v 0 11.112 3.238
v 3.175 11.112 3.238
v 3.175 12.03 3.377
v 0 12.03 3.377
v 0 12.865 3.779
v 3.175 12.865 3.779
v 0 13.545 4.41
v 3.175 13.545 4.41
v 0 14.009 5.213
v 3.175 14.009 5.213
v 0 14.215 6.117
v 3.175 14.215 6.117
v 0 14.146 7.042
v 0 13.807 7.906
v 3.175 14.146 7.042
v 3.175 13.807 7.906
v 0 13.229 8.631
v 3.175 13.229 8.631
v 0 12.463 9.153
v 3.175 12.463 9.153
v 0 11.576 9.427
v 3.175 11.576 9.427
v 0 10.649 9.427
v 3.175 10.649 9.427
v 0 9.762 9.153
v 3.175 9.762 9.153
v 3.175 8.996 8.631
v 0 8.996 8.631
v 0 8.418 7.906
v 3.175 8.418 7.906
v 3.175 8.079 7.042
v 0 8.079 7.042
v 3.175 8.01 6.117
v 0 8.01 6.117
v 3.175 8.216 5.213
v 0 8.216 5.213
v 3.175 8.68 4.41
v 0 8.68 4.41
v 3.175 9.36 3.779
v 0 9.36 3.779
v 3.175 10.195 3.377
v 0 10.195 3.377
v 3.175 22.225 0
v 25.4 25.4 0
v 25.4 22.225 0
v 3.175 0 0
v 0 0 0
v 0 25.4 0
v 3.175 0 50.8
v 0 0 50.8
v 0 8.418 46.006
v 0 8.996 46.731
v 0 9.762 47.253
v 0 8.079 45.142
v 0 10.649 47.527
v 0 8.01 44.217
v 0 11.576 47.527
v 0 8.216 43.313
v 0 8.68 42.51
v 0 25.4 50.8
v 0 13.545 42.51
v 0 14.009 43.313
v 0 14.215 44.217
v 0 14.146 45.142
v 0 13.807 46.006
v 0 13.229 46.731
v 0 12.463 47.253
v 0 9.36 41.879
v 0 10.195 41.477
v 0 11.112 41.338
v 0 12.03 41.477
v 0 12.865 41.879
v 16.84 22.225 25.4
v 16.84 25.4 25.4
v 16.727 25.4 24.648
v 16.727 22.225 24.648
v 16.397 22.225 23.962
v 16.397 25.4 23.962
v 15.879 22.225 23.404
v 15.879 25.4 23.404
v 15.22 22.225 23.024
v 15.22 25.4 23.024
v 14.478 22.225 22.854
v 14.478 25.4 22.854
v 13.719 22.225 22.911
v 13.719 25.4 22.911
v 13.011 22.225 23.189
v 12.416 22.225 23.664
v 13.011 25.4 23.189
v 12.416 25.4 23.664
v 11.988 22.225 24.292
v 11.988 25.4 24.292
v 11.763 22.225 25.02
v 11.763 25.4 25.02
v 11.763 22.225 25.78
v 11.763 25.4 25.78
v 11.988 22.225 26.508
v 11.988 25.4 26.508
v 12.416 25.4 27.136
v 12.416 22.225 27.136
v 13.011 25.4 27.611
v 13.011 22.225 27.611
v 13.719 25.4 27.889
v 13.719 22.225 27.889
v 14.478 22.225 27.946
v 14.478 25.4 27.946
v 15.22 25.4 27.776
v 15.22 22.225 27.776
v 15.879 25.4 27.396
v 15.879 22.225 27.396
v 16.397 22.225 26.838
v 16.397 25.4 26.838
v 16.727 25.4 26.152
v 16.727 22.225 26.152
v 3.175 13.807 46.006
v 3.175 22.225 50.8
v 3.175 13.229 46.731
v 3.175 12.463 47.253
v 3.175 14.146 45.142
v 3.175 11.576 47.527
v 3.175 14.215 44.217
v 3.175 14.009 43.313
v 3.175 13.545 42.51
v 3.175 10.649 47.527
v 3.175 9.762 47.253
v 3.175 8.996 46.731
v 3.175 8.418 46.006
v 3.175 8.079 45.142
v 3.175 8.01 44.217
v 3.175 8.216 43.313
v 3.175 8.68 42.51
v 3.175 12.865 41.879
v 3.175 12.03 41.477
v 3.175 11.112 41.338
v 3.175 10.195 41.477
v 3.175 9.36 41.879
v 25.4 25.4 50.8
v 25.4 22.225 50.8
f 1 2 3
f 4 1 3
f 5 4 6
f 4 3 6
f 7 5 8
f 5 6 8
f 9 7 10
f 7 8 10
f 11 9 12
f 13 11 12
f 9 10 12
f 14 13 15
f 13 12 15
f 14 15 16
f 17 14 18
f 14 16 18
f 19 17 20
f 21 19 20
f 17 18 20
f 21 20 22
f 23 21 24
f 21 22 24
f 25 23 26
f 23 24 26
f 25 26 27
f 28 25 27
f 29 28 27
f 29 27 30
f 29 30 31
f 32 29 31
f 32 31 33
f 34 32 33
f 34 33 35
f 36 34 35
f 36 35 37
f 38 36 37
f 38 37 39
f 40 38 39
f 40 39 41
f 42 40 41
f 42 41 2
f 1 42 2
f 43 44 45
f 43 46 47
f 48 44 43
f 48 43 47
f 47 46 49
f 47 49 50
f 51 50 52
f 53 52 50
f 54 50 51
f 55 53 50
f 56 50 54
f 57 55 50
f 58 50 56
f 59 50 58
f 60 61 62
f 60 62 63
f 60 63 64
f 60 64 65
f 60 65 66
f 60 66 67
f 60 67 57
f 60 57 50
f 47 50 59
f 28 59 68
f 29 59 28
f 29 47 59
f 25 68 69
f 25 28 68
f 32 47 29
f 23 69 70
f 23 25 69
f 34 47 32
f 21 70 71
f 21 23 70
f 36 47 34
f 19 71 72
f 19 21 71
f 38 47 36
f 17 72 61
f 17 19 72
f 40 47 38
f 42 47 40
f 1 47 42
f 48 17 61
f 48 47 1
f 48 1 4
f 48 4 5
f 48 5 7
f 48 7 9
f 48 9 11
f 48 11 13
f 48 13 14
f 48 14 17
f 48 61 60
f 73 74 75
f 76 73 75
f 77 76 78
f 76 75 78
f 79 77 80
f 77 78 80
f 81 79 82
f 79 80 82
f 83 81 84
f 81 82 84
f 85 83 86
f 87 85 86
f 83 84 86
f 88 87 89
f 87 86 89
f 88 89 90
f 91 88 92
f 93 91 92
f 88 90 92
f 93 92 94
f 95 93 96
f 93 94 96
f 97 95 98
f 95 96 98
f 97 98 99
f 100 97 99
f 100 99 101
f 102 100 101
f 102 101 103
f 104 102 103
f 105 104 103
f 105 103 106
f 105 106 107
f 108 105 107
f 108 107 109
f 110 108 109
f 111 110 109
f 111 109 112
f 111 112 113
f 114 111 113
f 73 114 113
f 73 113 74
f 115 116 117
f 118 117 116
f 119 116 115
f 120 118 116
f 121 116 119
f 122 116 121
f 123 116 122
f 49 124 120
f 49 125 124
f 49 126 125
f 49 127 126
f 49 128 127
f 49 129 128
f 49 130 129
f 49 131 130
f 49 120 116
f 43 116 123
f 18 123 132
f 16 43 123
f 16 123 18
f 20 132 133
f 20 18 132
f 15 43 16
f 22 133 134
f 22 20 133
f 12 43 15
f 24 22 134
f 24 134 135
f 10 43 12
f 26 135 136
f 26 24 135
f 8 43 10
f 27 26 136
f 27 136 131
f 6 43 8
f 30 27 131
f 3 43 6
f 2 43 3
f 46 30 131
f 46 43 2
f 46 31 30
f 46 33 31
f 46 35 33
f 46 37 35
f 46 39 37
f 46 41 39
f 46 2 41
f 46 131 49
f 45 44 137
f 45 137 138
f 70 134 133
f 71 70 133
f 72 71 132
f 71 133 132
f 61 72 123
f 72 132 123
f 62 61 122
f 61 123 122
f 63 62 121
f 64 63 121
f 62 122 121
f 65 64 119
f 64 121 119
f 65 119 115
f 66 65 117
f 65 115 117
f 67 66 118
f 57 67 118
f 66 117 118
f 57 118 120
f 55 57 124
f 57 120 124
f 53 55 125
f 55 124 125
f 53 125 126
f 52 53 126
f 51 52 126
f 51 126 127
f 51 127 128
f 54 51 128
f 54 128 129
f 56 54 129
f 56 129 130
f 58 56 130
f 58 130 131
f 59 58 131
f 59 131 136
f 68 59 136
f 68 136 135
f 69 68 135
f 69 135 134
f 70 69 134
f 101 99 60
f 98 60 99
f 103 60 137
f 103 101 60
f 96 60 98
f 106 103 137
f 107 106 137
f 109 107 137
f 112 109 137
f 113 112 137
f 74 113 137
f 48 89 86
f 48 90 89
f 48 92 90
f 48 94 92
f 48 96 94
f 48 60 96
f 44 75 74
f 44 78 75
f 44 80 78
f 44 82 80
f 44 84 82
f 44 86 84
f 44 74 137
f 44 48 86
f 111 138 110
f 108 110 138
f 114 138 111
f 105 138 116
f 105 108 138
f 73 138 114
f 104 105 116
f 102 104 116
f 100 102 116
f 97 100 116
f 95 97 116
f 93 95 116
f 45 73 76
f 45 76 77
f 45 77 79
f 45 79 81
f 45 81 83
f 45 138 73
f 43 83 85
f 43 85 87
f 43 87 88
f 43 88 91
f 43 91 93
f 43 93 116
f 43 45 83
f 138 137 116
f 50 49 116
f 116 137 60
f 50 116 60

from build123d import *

# Parameters (mm, degrees)
BOSS_EXTRUDE1_DEPTH    = 50.8
SKETCH6_R              = 3.1115
CUT_EXTRUDE1_DEPTH     = 4.175
F_10_CLEARANCE_HOLE2_D = 5.1054


with BuildPart() as part:
    # Sketch3 → Boss-Extrude1 (new body)
    with BuildSketch(Plane.XY):
        Polygon((0, 0), (0, 25.4), (25.4, 25.4), (25.4, 22.225), (3.175, 22.225), (3.175, 0), align=None)
    extrude(amount=BOSS_EXTRUDE1_DEPTH)

    # Sketch6 → Cut-Extrude1 (cut, through all)
    with BuildSketch(Plane(origin=(3.175, 0, 0), x_dir=(0, 0, -1), z_dir=(1, 0, 0))):
        with Locations((-44.45, 11.1125)):
            Circle(SKETCH6_R)
        with Locations((-6.35, 11.1125)):
            Circle(SKETCH6_R)
    extrude(amount=-CUT_EXTRUDE1_DEPTH, mode=Mode.SUBTRACT)

    # #10 Clearance Hole2 (through all)
    with Locations(Plane(origin=(0, 22.225, 0), x_dir=(-1, 0, 0), z_dir=(0, -1, 0))):
        with Locations((-14.2875, -25.4)):
            Hole(F_10_CLEARANCE_HOLE2_D / 2)


solid = part.part
